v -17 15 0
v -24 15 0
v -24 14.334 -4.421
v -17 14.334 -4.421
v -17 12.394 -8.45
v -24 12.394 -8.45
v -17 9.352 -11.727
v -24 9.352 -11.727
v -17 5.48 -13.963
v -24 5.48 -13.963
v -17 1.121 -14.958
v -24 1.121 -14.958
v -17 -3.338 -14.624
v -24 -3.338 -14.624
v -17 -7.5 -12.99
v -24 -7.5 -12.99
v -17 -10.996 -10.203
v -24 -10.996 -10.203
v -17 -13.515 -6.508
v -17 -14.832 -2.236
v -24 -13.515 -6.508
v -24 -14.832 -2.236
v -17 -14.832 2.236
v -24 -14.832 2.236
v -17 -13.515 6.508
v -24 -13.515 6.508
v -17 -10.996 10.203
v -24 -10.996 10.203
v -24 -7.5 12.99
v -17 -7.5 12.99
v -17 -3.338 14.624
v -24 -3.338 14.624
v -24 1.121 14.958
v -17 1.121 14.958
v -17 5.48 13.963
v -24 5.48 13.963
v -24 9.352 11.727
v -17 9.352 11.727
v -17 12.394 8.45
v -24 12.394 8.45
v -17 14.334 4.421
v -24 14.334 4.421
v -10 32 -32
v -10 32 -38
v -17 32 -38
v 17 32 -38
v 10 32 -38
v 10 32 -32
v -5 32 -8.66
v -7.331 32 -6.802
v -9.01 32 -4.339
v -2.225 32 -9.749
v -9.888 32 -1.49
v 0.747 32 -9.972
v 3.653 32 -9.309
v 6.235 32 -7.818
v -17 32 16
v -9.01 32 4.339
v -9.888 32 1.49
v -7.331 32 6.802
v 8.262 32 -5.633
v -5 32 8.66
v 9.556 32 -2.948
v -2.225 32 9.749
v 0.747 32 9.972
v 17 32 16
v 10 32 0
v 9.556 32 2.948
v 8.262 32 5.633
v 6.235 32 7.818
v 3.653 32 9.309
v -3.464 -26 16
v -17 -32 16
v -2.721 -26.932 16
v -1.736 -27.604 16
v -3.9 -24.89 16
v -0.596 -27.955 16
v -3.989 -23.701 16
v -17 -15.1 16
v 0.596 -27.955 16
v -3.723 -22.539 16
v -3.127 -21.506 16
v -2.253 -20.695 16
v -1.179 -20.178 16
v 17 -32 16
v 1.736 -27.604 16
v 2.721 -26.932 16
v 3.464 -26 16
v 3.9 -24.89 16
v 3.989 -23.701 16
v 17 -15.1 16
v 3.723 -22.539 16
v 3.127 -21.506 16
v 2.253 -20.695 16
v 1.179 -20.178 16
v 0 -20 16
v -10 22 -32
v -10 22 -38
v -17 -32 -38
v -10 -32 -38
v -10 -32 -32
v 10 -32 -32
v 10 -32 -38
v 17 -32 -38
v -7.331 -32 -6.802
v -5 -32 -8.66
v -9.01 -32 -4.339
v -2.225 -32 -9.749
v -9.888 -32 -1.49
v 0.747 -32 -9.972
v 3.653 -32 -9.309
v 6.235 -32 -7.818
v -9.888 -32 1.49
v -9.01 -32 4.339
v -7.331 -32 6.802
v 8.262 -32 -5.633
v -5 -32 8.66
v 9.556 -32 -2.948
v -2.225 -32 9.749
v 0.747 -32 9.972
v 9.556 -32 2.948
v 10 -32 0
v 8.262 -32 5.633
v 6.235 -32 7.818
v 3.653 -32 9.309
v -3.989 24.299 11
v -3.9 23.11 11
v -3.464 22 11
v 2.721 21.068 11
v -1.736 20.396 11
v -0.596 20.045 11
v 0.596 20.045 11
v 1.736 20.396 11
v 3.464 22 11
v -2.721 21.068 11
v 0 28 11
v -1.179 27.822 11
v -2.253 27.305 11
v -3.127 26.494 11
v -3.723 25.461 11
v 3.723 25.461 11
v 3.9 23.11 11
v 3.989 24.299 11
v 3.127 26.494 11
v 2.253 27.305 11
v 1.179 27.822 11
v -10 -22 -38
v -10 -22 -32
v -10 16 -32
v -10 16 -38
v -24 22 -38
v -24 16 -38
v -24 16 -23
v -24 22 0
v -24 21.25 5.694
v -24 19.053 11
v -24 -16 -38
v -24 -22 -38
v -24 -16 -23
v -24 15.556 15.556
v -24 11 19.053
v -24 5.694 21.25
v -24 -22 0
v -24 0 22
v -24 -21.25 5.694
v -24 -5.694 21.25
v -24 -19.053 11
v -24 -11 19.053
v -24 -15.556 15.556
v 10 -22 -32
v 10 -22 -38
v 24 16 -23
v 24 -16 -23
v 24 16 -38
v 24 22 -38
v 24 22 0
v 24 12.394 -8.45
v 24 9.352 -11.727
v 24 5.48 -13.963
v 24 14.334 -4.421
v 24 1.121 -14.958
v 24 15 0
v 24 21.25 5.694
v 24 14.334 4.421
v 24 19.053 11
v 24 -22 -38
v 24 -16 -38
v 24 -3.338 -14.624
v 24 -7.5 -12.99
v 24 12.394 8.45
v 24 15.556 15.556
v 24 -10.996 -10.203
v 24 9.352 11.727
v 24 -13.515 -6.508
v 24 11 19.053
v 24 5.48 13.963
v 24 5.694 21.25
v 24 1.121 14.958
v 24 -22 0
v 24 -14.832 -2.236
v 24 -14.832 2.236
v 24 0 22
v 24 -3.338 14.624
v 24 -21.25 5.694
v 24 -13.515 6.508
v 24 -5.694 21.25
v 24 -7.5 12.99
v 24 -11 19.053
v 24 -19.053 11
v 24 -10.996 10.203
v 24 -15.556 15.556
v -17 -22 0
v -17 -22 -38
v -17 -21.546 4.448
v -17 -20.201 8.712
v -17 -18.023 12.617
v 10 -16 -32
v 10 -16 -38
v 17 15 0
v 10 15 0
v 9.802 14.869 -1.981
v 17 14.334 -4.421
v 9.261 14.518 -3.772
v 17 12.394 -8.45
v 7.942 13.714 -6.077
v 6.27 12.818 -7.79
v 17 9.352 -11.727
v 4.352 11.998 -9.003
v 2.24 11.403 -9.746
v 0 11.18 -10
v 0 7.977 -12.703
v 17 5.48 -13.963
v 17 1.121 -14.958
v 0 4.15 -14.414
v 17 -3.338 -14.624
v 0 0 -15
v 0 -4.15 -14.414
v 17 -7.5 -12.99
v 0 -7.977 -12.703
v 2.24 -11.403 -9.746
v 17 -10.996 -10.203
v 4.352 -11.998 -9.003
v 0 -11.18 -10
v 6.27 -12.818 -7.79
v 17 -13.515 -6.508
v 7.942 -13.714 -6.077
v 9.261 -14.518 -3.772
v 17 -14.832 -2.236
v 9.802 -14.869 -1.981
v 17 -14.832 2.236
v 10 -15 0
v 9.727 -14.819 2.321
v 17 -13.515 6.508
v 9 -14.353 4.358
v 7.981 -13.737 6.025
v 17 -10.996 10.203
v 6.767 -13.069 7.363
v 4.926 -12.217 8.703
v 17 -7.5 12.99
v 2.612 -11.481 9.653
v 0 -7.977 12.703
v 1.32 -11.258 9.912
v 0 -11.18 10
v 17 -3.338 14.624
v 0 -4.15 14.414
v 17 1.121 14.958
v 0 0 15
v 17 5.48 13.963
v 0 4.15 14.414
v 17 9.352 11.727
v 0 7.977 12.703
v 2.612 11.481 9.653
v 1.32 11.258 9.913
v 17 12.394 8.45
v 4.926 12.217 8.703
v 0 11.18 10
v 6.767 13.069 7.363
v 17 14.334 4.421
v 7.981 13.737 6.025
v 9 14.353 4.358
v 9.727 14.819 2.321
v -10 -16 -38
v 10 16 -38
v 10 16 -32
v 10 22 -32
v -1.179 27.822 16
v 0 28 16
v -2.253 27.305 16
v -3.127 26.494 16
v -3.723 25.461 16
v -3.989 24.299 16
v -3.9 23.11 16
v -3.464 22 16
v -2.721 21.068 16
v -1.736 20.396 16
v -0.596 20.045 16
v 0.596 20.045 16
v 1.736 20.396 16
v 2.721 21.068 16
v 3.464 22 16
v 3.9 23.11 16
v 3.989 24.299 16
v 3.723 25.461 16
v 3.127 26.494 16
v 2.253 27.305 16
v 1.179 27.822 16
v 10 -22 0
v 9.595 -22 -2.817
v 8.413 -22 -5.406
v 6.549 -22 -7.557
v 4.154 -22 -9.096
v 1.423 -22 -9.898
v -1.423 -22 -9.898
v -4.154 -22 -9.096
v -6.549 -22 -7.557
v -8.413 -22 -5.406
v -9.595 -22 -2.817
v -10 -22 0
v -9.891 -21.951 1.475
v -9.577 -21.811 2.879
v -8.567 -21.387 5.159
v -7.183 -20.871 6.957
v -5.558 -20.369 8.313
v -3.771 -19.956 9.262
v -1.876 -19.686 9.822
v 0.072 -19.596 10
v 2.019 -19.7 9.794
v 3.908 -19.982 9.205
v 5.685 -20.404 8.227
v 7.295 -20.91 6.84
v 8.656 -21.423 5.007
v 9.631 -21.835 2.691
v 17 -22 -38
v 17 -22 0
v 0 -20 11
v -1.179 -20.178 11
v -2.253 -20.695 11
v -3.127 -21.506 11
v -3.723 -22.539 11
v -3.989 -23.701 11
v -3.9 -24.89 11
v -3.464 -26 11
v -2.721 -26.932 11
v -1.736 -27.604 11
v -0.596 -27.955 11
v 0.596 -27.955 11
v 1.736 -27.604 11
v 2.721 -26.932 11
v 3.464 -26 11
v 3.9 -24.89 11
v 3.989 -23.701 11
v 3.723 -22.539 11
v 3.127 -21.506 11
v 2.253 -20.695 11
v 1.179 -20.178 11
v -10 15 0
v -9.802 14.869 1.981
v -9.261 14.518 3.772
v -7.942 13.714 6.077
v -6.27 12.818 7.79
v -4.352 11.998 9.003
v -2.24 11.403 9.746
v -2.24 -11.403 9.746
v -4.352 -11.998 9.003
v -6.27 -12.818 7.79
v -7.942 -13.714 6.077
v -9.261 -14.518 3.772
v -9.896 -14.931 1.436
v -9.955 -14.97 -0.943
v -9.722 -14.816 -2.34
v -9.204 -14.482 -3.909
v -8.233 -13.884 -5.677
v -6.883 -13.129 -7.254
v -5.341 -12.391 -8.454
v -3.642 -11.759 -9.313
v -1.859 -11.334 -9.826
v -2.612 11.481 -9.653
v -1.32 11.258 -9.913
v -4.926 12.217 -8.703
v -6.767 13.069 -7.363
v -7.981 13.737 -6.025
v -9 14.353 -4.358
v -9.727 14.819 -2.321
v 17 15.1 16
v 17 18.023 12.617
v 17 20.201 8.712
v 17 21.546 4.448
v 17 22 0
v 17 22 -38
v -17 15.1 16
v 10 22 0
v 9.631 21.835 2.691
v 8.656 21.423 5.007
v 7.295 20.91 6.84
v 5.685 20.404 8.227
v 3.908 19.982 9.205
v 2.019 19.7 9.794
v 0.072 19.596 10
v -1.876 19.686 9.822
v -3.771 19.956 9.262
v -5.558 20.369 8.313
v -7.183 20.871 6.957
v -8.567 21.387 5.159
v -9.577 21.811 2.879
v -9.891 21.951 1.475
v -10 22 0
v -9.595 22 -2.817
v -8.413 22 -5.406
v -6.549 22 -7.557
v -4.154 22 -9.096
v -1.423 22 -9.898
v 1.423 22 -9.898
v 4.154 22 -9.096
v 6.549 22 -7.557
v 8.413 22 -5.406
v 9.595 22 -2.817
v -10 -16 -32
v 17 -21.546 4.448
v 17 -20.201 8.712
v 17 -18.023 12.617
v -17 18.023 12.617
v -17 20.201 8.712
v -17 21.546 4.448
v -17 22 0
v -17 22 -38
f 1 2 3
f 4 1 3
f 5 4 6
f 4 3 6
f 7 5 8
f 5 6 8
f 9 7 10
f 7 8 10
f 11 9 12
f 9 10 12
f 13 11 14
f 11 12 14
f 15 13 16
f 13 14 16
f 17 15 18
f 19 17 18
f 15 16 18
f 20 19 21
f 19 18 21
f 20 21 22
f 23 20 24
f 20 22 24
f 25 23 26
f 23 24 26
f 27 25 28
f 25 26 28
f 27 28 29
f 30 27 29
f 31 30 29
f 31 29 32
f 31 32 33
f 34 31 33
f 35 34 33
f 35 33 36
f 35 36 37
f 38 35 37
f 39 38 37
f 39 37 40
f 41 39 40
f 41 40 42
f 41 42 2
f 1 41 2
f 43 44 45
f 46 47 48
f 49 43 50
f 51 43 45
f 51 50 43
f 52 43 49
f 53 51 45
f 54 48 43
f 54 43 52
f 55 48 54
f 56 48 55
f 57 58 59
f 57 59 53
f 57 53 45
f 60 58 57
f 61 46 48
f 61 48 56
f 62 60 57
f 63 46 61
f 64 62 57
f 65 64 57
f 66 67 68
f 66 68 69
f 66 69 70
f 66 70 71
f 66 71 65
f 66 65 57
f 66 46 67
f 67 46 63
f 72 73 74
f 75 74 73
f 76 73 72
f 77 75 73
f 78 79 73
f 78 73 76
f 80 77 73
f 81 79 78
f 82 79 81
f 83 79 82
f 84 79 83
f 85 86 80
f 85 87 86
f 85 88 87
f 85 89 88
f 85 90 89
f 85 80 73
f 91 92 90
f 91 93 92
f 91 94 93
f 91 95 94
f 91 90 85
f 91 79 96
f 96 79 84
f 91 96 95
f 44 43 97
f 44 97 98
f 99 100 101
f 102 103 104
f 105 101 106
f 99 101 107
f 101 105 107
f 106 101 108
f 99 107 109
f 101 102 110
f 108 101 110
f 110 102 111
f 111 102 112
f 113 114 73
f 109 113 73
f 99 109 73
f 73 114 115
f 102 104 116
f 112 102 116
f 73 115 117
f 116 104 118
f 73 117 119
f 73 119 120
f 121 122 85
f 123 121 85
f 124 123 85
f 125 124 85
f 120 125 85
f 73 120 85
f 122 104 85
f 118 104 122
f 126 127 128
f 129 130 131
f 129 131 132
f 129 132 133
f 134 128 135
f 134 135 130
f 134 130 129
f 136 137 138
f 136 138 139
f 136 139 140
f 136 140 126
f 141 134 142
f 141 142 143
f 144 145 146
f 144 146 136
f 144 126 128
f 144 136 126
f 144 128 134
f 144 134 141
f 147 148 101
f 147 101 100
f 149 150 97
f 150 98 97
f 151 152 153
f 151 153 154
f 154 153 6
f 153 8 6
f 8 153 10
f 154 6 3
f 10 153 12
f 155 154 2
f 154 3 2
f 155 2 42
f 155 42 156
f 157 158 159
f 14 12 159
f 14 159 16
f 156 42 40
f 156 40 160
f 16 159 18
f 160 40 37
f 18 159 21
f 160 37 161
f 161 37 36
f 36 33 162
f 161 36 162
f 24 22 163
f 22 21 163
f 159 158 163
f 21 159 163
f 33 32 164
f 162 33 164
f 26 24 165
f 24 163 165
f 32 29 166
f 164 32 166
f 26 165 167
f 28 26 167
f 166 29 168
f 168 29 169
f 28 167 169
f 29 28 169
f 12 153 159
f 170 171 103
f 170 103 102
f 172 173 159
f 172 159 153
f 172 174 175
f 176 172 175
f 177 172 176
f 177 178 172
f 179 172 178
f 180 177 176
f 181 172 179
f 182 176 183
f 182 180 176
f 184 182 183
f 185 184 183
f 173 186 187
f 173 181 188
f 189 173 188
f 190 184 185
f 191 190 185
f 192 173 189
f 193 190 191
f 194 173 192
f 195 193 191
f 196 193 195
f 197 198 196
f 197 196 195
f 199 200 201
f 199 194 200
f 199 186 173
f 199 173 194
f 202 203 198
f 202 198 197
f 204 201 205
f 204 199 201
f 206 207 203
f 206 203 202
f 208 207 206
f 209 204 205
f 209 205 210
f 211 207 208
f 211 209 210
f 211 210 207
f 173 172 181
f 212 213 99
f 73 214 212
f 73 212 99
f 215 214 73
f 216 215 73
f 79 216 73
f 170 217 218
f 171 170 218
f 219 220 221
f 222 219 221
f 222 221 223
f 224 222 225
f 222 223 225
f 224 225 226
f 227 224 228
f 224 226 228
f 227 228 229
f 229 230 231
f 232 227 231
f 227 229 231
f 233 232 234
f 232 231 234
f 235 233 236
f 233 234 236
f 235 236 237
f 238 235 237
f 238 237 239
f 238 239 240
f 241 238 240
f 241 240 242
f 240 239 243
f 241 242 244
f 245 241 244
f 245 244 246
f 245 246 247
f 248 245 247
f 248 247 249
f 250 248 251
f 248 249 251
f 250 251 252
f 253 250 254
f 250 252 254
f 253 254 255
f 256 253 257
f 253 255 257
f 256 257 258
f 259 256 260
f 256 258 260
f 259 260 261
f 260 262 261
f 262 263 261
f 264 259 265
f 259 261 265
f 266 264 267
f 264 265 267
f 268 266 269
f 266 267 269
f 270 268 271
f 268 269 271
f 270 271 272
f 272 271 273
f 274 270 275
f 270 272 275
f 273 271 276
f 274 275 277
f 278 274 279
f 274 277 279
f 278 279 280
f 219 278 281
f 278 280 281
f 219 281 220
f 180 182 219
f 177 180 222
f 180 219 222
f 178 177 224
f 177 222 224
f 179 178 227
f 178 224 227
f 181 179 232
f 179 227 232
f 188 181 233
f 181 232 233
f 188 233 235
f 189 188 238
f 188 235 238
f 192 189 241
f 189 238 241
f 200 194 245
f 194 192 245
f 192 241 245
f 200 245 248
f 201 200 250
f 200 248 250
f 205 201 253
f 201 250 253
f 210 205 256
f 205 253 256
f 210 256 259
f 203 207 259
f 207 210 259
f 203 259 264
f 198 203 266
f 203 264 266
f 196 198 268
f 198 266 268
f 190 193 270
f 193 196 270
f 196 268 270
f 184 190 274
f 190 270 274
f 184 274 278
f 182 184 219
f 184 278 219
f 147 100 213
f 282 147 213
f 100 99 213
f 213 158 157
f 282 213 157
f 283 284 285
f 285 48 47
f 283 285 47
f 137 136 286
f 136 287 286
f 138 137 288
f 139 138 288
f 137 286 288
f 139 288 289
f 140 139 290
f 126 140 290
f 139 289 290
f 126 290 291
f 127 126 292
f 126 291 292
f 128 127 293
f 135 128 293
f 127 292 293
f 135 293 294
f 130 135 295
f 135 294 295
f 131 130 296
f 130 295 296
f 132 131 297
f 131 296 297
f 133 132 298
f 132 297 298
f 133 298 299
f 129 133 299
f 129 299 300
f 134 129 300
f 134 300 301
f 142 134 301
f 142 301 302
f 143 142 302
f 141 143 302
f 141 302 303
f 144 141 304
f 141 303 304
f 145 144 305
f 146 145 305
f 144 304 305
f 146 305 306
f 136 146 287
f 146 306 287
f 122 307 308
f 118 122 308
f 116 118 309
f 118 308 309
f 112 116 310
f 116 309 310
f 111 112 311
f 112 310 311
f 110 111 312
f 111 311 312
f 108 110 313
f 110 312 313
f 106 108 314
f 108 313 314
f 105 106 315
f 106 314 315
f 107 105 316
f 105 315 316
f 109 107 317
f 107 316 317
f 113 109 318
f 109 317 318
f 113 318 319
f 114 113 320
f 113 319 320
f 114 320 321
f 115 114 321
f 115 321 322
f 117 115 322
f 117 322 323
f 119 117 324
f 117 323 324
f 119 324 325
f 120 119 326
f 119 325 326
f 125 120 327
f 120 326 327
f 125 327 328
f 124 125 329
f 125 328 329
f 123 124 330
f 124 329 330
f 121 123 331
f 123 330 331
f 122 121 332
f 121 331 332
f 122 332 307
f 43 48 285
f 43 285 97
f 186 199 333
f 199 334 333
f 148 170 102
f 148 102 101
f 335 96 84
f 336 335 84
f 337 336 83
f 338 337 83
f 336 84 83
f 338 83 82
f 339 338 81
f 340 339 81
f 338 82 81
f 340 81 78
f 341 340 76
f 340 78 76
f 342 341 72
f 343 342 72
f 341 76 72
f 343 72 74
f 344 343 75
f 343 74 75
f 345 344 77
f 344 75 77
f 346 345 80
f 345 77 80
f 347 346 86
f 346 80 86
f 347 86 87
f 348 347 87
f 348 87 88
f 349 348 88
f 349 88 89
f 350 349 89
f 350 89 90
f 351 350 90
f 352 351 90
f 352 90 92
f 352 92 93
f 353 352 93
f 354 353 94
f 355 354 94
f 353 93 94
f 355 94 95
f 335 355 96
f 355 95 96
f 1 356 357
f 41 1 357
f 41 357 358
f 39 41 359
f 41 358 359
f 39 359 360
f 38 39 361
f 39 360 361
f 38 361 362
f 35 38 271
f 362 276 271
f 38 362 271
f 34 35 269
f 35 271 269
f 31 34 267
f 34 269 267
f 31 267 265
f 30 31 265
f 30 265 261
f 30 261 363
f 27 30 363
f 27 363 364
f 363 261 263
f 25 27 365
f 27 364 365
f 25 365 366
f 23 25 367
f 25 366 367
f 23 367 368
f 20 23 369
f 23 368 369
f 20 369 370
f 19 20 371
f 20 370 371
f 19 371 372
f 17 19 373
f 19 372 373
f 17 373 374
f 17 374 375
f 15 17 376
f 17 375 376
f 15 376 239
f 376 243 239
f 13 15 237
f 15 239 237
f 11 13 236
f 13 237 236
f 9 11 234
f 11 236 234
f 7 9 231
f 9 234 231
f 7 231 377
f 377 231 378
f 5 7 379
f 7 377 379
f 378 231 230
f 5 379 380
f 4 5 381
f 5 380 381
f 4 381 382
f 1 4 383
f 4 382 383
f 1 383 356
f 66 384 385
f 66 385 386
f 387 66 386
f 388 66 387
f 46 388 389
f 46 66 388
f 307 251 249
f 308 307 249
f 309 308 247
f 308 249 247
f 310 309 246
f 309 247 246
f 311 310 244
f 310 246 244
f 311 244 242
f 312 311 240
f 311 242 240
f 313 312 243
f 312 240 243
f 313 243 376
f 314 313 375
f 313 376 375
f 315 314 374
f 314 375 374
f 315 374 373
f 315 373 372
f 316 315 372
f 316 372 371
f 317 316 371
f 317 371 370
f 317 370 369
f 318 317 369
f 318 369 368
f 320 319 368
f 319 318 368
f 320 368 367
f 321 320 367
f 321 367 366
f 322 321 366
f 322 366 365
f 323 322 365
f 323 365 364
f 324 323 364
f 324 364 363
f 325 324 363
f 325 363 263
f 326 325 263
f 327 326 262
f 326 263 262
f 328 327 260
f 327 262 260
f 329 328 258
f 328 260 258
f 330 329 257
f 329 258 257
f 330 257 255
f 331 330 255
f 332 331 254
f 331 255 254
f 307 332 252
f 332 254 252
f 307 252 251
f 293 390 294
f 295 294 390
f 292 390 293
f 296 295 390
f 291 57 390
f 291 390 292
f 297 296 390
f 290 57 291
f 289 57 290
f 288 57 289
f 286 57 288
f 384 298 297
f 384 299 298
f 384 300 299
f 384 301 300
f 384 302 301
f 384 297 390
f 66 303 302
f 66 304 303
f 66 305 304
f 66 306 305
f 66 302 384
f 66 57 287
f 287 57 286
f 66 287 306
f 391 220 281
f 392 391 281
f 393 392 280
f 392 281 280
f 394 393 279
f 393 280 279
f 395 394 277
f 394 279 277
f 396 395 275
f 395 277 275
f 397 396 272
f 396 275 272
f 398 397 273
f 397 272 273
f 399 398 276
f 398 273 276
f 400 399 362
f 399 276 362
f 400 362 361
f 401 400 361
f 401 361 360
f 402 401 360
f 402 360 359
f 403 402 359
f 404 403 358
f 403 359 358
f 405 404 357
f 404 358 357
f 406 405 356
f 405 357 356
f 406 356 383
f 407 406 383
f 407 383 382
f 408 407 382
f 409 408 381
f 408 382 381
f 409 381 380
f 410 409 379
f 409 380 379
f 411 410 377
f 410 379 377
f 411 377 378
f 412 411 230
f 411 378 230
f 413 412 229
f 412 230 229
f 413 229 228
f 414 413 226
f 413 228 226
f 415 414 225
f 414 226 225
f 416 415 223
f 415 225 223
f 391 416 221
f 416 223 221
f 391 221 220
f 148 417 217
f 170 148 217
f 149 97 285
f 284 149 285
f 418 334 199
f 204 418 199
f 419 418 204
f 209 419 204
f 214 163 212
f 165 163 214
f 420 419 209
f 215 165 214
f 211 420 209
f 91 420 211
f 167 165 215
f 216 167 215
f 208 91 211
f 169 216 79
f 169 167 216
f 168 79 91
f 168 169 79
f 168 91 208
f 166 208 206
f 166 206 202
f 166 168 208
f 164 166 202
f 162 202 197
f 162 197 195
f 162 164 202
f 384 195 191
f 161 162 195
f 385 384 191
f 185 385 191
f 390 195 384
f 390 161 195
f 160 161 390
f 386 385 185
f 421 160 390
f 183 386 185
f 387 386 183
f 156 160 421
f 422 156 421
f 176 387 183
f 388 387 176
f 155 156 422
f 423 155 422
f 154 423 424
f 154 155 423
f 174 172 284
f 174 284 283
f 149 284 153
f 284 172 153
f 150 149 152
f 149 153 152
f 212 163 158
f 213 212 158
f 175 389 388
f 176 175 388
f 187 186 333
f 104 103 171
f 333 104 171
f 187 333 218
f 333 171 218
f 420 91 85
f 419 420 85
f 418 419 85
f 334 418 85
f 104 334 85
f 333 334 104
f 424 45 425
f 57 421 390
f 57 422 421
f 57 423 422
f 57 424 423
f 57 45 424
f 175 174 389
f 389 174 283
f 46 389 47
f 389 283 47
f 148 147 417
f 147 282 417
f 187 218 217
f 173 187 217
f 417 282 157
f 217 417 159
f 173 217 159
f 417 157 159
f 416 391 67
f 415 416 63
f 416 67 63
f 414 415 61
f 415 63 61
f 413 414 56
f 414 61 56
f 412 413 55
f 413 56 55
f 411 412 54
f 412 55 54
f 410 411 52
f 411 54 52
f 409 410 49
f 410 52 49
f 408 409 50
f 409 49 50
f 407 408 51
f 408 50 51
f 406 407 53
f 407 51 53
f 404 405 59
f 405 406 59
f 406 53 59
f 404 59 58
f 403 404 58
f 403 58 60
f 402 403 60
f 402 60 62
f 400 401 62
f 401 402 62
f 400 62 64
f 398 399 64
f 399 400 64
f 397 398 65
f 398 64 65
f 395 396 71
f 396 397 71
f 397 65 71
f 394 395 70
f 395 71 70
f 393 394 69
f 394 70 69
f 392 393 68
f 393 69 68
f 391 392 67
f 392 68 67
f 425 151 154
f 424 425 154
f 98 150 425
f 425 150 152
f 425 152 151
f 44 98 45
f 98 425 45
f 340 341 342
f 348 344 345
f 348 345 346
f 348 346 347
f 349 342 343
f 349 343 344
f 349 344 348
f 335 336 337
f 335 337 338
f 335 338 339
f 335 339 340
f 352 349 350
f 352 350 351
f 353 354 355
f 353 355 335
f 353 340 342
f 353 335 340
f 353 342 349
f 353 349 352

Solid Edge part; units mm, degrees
sketch "Sketch1" plane through (0, 0, 0) normal (1, 0, 0) x (0, 1, 0)
  line L0 (22, -38) -> (22, 0)
  line L1 (16, -38) -> (22, -38)
  line L2 (16, -23) -> (16, -38)
  line L3 (-16, -23) -> (16, -23)
  line L4 (-16, -38) -> (-16, -23)
  line L5 (-22, -38) -> (-16, -38)
  line L6 (-22, 0) -> (-22, -38)
  arc A0 (-22, 0) -> (22, 0) centre (0, 0) cw
  circle A1 centre (0, 0) radius 15
extrude "Protrusion1" add sketch "Sketch1" along normal mid plane 48
sketch "Sketch2" plane through (0, 0, 0) normal (0, -1, 0) x (1, 0, 0)
  line L0 (0, -32) -> (-10, -32)
  line L1 (-10, -32) -> (-10, -38)
  line L2 (-10, -38) -> (-17, -38)
  line L3 (-17, -38) -> (-17, 16)
  line L4 (-17, 16) -> (17, 16)
  line L5 (17, 16) -> (17, -38)
  line L6 (17, -38) -> (10, -38)
  line L7 (10, -38) -> (10, -32)
  line L8 (10, -32) -> (0, -32)
  circle A0 centre (0, 0) radius 10
extrude "ExtrudedProtrusion_3" add sketch "Sketch2" along normal mid plane 64
sketch "Sketch3" plane through (0, 0, 0) normal (1, 0, 0) x (0, 1, 0)
  circle A0 centre (0, 0) radius 15
extrude "ExtrudedCutout_1" cut sketch "Sketch3" along normal mid plane 64
sketch "Sketch4" plane through (0, 0, 0) normal (0, -1, 0) x (1, 0, 0)
  circle A0 centre (0, 0) radius 10
extrude "ExtrudedCutout_2" cut sketch "Sketch4" along normal mid plane 64
sketch "Sketch5" plane through (24, 0, -8) normal (1, 0, 0) x (0, 1, 0)
  line L0 (-16, -15) -> (16, -15)
  line L1 (16, -15) -> (16, -30)
  line L2 (16, -30) -> (-16, -30)
  line L3 (-16, -30) -> (-16, -15)
extrude "ExtrudedCutout_3" cut sketch "Sketch5" against normal blind 48
sketch "Sketch6" plane through (0, 32, -11) normal (0, 1, 0) x (0, 0, -1)
  line L0 (21, 10) -> (21, -10)
  line L1 (21, -10) -> (27, -10)
  line L2 (27, -10) -> (27, 10)
  line L3 (27, 10) -> (21, 10)
extrude "ExtrudedCutout_4" cut sketch "Sketch6" against normal blind 64
sketch "Sketch7" plane through (0, -23.5498, 16) normal (0, 0, 1) x (0, 1, 0)
  circle A0 centre (-0.4502, 0) radius 4
  circle A1 centre (47.5498, 0) radius 4
extrude "ExtrudedCutout_8" cut sketch "Sketch7" against normal blind 5
